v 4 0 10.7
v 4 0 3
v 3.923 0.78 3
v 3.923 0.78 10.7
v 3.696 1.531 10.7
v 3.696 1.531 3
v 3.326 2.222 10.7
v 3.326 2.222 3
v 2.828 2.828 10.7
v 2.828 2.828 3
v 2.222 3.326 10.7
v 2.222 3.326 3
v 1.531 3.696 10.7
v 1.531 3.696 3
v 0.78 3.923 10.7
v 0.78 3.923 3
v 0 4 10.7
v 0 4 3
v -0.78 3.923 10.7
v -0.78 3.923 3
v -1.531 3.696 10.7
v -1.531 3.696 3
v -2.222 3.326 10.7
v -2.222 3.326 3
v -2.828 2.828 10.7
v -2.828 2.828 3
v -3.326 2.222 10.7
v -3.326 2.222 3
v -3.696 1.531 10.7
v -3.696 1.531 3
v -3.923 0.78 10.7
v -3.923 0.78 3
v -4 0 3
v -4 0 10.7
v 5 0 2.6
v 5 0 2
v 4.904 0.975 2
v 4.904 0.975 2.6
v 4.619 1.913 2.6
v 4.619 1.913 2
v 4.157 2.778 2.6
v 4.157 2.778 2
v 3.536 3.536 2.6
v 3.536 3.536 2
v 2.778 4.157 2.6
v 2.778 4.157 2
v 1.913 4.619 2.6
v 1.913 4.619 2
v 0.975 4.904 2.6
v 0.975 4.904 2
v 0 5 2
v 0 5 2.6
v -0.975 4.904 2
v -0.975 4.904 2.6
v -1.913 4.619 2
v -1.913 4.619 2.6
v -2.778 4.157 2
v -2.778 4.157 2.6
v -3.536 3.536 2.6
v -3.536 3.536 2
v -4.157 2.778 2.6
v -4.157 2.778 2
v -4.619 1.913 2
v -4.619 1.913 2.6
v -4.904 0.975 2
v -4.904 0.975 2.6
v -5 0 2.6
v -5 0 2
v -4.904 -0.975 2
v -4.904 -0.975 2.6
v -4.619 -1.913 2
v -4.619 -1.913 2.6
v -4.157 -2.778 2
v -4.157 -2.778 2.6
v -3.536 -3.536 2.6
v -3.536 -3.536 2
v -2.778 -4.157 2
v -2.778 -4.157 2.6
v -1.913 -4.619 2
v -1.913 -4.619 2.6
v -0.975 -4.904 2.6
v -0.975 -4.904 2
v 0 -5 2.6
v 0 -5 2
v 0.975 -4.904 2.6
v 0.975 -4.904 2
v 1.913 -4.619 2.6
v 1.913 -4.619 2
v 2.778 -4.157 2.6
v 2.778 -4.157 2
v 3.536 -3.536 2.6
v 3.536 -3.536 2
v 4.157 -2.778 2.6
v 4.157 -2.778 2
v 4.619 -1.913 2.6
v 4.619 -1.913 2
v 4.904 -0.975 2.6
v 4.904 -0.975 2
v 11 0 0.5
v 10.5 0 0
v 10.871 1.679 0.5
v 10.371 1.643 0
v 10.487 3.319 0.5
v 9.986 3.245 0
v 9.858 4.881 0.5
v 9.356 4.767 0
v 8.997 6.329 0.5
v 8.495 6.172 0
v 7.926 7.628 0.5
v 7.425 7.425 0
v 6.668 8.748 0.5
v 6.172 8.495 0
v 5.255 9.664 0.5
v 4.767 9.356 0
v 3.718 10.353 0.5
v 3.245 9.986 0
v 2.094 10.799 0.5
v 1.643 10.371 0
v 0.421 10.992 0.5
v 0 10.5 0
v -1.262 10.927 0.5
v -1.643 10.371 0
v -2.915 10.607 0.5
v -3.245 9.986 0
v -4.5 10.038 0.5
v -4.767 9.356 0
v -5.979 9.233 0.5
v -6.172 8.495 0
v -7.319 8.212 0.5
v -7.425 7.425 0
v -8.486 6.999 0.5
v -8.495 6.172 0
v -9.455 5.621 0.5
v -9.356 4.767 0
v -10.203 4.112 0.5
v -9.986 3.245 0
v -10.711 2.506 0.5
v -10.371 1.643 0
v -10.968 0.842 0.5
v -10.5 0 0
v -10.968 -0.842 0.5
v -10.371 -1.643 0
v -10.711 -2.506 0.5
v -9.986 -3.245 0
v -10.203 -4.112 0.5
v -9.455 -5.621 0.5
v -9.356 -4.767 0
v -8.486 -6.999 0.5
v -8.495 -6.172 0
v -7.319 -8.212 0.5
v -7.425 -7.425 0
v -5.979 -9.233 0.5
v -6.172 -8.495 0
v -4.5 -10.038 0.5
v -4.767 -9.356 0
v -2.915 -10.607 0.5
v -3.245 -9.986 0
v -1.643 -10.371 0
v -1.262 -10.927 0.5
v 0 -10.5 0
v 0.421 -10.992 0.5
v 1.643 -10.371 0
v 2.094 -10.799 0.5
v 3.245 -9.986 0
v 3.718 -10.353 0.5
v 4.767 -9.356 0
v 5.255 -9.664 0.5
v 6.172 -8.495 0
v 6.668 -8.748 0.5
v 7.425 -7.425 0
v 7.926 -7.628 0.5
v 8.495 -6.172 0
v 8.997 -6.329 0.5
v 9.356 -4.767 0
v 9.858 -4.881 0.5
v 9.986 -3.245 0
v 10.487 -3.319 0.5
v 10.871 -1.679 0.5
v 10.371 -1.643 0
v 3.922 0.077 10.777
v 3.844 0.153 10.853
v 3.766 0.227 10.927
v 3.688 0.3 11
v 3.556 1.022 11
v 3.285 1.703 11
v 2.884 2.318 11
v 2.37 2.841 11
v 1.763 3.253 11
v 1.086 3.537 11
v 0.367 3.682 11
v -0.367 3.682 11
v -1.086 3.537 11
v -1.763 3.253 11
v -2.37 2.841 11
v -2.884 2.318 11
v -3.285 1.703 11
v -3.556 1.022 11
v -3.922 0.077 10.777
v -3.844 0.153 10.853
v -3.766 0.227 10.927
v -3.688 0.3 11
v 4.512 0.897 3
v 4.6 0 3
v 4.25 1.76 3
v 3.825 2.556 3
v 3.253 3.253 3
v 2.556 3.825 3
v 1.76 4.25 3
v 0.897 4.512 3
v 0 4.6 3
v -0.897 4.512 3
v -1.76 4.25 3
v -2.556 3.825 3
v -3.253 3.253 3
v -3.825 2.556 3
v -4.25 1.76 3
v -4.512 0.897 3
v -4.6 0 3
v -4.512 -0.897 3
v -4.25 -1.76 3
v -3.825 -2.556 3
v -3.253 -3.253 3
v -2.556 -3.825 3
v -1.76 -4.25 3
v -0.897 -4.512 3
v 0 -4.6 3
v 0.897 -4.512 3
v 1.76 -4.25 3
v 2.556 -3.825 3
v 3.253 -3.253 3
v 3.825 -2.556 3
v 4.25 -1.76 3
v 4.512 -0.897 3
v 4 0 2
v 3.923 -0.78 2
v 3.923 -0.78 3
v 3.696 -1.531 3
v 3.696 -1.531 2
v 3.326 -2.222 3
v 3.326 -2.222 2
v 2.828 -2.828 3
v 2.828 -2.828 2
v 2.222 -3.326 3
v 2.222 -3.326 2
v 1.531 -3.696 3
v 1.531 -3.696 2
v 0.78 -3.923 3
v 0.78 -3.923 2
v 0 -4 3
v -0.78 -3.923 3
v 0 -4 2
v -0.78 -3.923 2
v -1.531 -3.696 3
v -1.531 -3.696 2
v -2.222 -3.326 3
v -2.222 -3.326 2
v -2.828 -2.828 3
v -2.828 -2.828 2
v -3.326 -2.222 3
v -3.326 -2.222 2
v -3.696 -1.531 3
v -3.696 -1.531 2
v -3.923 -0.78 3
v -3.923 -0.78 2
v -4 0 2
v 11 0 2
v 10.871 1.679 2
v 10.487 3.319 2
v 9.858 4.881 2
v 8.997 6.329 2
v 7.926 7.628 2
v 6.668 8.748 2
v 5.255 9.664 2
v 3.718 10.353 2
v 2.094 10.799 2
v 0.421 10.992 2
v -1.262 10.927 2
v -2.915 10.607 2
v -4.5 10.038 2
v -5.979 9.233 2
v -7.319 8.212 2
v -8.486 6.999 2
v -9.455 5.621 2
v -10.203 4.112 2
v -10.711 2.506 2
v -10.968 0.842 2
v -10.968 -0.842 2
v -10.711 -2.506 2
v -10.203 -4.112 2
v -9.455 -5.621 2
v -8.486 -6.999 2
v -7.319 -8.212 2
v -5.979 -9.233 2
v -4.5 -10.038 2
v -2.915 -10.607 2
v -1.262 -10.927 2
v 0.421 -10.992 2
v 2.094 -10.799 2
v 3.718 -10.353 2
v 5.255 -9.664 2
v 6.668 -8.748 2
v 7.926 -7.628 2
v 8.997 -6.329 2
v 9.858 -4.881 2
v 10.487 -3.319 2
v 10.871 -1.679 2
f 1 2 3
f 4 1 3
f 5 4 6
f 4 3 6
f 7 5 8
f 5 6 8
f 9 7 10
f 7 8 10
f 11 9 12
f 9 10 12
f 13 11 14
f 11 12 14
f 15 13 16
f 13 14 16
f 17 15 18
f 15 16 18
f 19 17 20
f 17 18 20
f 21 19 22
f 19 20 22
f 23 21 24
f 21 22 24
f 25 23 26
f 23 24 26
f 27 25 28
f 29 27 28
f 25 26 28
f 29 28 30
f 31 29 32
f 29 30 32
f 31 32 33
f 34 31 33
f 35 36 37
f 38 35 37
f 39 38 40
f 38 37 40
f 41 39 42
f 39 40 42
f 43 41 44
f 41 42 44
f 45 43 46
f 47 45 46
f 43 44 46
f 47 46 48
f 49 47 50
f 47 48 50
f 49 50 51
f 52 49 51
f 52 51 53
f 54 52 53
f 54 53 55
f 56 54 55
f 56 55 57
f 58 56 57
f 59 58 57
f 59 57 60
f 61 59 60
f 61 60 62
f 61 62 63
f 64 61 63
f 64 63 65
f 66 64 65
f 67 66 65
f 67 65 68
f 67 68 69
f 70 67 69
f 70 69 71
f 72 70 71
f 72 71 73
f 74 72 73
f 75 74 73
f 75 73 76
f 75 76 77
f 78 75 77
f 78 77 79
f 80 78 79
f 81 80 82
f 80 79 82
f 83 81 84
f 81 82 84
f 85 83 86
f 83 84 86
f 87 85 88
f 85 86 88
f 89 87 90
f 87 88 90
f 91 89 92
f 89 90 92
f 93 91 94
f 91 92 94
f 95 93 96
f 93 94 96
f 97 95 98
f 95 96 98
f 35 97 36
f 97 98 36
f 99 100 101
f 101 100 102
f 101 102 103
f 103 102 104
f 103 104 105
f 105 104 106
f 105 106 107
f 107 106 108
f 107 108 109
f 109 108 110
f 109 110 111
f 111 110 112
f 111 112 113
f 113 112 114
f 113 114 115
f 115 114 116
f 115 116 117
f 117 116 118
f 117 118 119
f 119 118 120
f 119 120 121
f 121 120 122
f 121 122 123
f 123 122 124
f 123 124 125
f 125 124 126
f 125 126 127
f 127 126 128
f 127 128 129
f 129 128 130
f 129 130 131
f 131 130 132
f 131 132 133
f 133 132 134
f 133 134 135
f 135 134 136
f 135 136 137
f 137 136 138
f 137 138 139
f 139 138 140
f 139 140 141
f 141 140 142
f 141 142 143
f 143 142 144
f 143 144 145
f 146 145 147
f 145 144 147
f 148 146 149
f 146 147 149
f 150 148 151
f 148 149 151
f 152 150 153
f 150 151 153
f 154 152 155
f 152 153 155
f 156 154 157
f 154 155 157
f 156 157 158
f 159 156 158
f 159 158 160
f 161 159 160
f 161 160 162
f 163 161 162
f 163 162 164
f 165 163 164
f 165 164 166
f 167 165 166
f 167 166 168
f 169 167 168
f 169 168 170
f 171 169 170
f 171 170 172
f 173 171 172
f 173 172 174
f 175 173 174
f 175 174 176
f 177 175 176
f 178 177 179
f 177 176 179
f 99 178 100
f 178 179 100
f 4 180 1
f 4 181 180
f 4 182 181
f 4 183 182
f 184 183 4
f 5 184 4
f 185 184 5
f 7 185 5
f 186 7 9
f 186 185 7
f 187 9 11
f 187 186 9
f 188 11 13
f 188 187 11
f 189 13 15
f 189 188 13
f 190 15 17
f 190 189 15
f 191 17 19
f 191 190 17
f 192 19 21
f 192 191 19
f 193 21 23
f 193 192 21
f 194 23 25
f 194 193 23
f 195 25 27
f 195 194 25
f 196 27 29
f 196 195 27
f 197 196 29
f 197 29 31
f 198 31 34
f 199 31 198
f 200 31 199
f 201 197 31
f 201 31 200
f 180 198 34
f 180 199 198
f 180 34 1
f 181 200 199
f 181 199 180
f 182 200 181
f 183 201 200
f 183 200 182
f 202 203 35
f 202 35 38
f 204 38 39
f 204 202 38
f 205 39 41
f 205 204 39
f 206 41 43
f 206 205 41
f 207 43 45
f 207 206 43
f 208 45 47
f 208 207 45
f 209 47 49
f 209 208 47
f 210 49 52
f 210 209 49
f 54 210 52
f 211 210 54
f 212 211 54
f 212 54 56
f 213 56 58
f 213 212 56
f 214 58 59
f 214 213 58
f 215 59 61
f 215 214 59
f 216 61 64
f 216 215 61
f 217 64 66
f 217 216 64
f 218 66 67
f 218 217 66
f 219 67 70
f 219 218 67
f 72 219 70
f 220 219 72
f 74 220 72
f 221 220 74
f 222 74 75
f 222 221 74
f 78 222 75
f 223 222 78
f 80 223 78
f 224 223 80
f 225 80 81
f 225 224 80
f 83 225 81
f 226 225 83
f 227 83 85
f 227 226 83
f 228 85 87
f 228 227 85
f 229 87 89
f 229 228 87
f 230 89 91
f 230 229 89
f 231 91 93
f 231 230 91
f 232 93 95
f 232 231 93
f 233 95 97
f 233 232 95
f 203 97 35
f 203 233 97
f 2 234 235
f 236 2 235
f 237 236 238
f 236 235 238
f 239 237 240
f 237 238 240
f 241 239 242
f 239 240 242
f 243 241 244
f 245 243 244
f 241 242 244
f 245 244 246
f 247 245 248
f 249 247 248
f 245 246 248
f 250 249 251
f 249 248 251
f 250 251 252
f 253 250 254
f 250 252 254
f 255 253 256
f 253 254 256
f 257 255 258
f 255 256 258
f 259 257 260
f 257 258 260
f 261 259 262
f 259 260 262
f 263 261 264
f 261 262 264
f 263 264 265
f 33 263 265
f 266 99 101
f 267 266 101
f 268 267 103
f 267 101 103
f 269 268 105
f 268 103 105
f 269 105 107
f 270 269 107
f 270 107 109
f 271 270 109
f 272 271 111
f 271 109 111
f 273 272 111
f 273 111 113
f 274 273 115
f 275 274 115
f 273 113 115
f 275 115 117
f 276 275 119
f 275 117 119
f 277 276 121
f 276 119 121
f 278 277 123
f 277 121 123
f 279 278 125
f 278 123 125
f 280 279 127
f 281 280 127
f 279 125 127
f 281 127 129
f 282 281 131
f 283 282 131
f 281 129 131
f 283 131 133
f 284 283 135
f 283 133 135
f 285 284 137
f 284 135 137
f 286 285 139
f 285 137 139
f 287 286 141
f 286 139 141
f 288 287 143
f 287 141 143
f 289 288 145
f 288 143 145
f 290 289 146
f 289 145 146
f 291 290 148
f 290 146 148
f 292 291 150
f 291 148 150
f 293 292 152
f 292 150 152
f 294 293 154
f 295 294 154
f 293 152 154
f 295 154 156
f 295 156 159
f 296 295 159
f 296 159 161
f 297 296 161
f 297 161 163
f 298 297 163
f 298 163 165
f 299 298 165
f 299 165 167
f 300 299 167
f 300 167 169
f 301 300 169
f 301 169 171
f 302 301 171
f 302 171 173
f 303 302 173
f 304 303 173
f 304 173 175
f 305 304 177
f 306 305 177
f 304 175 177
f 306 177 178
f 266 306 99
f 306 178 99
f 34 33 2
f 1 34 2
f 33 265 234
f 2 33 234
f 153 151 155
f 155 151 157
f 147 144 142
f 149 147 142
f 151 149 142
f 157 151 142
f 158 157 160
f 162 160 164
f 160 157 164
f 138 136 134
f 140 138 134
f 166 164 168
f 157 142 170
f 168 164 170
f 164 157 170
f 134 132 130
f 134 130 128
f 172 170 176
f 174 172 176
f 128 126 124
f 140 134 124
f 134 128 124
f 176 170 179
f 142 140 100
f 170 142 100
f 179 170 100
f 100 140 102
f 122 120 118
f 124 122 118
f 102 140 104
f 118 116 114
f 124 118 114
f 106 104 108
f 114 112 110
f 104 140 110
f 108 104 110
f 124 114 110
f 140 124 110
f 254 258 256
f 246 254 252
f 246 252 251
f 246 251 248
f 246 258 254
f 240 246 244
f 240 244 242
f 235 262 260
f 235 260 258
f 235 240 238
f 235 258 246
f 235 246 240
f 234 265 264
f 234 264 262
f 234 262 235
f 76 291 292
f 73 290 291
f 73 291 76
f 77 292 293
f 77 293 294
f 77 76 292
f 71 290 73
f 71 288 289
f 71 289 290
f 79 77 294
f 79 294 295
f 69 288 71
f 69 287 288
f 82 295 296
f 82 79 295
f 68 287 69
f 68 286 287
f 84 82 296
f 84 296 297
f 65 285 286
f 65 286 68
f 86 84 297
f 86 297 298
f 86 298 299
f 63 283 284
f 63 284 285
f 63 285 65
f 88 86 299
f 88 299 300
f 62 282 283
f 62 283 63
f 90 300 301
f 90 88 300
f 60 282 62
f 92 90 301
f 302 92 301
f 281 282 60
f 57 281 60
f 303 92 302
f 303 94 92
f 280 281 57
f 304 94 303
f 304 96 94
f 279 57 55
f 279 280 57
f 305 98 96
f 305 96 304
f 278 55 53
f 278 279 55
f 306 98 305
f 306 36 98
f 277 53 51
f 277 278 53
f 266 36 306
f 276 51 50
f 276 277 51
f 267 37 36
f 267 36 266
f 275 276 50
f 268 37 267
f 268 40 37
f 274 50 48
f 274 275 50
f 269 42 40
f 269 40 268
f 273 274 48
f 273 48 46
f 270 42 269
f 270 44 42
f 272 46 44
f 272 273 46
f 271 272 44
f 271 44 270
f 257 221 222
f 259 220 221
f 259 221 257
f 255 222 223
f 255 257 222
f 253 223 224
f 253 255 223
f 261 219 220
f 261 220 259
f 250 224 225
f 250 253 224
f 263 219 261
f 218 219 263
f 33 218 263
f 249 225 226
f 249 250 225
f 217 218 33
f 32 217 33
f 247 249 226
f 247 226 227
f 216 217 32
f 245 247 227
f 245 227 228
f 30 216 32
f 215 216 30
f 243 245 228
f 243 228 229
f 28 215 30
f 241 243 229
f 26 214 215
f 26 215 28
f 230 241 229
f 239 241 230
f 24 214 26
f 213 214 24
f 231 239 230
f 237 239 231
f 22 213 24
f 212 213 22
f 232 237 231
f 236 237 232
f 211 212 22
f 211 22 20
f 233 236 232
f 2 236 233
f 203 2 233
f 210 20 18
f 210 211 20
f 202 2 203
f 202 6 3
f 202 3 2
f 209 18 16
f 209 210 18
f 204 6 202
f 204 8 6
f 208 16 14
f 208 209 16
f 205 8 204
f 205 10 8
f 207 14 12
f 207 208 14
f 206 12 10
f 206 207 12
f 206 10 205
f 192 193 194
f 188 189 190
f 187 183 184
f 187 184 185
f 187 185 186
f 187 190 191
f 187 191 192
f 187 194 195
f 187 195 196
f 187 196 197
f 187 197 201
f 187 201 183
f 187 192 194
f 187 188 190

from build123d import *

# Parameters (mm, degrees)
F2_DEPTH = 11
F1_R     = 5
F4_DEPTH = 3
F1_R_2   = 11
F6_DEPTH = 2
F7_DEPTH = 2
F8_SIZE  = 0.4
F9_SIZE  = 0.3
F10_SIZE = 0.5


with BuildPart() as f2:
    # F1 (on Top) → F2 (new body)
    with BuildSketch(Plane.XY):
        with BuildLine():
            Line((-4, 0), (4, 0))
            ThreePointArc((4, 0), (0, 4), (-4, 0))
        make_face()
    extrude(amount=F2_DEPTH)

    # F1 (on Top) → F4 (join)
    with BuildSketch(Plane.XY):
        Circle(F1_R)
        with BuildLine():
            ThreePointArc((-4, 0), (0, 4), (4, 0))
            ThreePointArc((4, 0), (0, -4), (-4, 0))
        make_face(mode=Mode.SUBTRACT)
    extrude(amount=F4_DEPTH)

    # F1 (on Top) → F6 (join)
    with BuildSketch(Plane.XY):
        Circle(F1_R_2)
        Circle(F1_R, mode=Mode.SUBTRACT)
    extrude(amount=F6_DEPTH)

    # F1 (on Top) → F7 (join)
    with BuildSketch(Plane.XY):
        with BuildLine():
            ThreePointArc((-4, 0), (0, -4), (4, 0))
            Line((4, 0), (-4, 0))
        make_face()
    extrude(amount=F7_DEPTH)

    # F8
    f8_edges = [f2.edges().sort_by_distance(p)[0] for p in [
        (-5, 0, 3),
    ]]
    chamfer(f8_edges, length=F8_SIZE)

    # F9
    f9_edges = [f2.edges().sort_by_distance(p)[0] for p in [
        (0, 4, 11),
        (0, 0, 11),
    ]]
    chamfer(f9_edges, length=F9_SIZE)

    # F10
    f10_edges = [f2.edges().sort_by_distance(p)[0] for p in [
        (-11, 0, 0),
    ]]
    chamfer(f10_edges, length=F10_SIZE)


solid = f2.part
